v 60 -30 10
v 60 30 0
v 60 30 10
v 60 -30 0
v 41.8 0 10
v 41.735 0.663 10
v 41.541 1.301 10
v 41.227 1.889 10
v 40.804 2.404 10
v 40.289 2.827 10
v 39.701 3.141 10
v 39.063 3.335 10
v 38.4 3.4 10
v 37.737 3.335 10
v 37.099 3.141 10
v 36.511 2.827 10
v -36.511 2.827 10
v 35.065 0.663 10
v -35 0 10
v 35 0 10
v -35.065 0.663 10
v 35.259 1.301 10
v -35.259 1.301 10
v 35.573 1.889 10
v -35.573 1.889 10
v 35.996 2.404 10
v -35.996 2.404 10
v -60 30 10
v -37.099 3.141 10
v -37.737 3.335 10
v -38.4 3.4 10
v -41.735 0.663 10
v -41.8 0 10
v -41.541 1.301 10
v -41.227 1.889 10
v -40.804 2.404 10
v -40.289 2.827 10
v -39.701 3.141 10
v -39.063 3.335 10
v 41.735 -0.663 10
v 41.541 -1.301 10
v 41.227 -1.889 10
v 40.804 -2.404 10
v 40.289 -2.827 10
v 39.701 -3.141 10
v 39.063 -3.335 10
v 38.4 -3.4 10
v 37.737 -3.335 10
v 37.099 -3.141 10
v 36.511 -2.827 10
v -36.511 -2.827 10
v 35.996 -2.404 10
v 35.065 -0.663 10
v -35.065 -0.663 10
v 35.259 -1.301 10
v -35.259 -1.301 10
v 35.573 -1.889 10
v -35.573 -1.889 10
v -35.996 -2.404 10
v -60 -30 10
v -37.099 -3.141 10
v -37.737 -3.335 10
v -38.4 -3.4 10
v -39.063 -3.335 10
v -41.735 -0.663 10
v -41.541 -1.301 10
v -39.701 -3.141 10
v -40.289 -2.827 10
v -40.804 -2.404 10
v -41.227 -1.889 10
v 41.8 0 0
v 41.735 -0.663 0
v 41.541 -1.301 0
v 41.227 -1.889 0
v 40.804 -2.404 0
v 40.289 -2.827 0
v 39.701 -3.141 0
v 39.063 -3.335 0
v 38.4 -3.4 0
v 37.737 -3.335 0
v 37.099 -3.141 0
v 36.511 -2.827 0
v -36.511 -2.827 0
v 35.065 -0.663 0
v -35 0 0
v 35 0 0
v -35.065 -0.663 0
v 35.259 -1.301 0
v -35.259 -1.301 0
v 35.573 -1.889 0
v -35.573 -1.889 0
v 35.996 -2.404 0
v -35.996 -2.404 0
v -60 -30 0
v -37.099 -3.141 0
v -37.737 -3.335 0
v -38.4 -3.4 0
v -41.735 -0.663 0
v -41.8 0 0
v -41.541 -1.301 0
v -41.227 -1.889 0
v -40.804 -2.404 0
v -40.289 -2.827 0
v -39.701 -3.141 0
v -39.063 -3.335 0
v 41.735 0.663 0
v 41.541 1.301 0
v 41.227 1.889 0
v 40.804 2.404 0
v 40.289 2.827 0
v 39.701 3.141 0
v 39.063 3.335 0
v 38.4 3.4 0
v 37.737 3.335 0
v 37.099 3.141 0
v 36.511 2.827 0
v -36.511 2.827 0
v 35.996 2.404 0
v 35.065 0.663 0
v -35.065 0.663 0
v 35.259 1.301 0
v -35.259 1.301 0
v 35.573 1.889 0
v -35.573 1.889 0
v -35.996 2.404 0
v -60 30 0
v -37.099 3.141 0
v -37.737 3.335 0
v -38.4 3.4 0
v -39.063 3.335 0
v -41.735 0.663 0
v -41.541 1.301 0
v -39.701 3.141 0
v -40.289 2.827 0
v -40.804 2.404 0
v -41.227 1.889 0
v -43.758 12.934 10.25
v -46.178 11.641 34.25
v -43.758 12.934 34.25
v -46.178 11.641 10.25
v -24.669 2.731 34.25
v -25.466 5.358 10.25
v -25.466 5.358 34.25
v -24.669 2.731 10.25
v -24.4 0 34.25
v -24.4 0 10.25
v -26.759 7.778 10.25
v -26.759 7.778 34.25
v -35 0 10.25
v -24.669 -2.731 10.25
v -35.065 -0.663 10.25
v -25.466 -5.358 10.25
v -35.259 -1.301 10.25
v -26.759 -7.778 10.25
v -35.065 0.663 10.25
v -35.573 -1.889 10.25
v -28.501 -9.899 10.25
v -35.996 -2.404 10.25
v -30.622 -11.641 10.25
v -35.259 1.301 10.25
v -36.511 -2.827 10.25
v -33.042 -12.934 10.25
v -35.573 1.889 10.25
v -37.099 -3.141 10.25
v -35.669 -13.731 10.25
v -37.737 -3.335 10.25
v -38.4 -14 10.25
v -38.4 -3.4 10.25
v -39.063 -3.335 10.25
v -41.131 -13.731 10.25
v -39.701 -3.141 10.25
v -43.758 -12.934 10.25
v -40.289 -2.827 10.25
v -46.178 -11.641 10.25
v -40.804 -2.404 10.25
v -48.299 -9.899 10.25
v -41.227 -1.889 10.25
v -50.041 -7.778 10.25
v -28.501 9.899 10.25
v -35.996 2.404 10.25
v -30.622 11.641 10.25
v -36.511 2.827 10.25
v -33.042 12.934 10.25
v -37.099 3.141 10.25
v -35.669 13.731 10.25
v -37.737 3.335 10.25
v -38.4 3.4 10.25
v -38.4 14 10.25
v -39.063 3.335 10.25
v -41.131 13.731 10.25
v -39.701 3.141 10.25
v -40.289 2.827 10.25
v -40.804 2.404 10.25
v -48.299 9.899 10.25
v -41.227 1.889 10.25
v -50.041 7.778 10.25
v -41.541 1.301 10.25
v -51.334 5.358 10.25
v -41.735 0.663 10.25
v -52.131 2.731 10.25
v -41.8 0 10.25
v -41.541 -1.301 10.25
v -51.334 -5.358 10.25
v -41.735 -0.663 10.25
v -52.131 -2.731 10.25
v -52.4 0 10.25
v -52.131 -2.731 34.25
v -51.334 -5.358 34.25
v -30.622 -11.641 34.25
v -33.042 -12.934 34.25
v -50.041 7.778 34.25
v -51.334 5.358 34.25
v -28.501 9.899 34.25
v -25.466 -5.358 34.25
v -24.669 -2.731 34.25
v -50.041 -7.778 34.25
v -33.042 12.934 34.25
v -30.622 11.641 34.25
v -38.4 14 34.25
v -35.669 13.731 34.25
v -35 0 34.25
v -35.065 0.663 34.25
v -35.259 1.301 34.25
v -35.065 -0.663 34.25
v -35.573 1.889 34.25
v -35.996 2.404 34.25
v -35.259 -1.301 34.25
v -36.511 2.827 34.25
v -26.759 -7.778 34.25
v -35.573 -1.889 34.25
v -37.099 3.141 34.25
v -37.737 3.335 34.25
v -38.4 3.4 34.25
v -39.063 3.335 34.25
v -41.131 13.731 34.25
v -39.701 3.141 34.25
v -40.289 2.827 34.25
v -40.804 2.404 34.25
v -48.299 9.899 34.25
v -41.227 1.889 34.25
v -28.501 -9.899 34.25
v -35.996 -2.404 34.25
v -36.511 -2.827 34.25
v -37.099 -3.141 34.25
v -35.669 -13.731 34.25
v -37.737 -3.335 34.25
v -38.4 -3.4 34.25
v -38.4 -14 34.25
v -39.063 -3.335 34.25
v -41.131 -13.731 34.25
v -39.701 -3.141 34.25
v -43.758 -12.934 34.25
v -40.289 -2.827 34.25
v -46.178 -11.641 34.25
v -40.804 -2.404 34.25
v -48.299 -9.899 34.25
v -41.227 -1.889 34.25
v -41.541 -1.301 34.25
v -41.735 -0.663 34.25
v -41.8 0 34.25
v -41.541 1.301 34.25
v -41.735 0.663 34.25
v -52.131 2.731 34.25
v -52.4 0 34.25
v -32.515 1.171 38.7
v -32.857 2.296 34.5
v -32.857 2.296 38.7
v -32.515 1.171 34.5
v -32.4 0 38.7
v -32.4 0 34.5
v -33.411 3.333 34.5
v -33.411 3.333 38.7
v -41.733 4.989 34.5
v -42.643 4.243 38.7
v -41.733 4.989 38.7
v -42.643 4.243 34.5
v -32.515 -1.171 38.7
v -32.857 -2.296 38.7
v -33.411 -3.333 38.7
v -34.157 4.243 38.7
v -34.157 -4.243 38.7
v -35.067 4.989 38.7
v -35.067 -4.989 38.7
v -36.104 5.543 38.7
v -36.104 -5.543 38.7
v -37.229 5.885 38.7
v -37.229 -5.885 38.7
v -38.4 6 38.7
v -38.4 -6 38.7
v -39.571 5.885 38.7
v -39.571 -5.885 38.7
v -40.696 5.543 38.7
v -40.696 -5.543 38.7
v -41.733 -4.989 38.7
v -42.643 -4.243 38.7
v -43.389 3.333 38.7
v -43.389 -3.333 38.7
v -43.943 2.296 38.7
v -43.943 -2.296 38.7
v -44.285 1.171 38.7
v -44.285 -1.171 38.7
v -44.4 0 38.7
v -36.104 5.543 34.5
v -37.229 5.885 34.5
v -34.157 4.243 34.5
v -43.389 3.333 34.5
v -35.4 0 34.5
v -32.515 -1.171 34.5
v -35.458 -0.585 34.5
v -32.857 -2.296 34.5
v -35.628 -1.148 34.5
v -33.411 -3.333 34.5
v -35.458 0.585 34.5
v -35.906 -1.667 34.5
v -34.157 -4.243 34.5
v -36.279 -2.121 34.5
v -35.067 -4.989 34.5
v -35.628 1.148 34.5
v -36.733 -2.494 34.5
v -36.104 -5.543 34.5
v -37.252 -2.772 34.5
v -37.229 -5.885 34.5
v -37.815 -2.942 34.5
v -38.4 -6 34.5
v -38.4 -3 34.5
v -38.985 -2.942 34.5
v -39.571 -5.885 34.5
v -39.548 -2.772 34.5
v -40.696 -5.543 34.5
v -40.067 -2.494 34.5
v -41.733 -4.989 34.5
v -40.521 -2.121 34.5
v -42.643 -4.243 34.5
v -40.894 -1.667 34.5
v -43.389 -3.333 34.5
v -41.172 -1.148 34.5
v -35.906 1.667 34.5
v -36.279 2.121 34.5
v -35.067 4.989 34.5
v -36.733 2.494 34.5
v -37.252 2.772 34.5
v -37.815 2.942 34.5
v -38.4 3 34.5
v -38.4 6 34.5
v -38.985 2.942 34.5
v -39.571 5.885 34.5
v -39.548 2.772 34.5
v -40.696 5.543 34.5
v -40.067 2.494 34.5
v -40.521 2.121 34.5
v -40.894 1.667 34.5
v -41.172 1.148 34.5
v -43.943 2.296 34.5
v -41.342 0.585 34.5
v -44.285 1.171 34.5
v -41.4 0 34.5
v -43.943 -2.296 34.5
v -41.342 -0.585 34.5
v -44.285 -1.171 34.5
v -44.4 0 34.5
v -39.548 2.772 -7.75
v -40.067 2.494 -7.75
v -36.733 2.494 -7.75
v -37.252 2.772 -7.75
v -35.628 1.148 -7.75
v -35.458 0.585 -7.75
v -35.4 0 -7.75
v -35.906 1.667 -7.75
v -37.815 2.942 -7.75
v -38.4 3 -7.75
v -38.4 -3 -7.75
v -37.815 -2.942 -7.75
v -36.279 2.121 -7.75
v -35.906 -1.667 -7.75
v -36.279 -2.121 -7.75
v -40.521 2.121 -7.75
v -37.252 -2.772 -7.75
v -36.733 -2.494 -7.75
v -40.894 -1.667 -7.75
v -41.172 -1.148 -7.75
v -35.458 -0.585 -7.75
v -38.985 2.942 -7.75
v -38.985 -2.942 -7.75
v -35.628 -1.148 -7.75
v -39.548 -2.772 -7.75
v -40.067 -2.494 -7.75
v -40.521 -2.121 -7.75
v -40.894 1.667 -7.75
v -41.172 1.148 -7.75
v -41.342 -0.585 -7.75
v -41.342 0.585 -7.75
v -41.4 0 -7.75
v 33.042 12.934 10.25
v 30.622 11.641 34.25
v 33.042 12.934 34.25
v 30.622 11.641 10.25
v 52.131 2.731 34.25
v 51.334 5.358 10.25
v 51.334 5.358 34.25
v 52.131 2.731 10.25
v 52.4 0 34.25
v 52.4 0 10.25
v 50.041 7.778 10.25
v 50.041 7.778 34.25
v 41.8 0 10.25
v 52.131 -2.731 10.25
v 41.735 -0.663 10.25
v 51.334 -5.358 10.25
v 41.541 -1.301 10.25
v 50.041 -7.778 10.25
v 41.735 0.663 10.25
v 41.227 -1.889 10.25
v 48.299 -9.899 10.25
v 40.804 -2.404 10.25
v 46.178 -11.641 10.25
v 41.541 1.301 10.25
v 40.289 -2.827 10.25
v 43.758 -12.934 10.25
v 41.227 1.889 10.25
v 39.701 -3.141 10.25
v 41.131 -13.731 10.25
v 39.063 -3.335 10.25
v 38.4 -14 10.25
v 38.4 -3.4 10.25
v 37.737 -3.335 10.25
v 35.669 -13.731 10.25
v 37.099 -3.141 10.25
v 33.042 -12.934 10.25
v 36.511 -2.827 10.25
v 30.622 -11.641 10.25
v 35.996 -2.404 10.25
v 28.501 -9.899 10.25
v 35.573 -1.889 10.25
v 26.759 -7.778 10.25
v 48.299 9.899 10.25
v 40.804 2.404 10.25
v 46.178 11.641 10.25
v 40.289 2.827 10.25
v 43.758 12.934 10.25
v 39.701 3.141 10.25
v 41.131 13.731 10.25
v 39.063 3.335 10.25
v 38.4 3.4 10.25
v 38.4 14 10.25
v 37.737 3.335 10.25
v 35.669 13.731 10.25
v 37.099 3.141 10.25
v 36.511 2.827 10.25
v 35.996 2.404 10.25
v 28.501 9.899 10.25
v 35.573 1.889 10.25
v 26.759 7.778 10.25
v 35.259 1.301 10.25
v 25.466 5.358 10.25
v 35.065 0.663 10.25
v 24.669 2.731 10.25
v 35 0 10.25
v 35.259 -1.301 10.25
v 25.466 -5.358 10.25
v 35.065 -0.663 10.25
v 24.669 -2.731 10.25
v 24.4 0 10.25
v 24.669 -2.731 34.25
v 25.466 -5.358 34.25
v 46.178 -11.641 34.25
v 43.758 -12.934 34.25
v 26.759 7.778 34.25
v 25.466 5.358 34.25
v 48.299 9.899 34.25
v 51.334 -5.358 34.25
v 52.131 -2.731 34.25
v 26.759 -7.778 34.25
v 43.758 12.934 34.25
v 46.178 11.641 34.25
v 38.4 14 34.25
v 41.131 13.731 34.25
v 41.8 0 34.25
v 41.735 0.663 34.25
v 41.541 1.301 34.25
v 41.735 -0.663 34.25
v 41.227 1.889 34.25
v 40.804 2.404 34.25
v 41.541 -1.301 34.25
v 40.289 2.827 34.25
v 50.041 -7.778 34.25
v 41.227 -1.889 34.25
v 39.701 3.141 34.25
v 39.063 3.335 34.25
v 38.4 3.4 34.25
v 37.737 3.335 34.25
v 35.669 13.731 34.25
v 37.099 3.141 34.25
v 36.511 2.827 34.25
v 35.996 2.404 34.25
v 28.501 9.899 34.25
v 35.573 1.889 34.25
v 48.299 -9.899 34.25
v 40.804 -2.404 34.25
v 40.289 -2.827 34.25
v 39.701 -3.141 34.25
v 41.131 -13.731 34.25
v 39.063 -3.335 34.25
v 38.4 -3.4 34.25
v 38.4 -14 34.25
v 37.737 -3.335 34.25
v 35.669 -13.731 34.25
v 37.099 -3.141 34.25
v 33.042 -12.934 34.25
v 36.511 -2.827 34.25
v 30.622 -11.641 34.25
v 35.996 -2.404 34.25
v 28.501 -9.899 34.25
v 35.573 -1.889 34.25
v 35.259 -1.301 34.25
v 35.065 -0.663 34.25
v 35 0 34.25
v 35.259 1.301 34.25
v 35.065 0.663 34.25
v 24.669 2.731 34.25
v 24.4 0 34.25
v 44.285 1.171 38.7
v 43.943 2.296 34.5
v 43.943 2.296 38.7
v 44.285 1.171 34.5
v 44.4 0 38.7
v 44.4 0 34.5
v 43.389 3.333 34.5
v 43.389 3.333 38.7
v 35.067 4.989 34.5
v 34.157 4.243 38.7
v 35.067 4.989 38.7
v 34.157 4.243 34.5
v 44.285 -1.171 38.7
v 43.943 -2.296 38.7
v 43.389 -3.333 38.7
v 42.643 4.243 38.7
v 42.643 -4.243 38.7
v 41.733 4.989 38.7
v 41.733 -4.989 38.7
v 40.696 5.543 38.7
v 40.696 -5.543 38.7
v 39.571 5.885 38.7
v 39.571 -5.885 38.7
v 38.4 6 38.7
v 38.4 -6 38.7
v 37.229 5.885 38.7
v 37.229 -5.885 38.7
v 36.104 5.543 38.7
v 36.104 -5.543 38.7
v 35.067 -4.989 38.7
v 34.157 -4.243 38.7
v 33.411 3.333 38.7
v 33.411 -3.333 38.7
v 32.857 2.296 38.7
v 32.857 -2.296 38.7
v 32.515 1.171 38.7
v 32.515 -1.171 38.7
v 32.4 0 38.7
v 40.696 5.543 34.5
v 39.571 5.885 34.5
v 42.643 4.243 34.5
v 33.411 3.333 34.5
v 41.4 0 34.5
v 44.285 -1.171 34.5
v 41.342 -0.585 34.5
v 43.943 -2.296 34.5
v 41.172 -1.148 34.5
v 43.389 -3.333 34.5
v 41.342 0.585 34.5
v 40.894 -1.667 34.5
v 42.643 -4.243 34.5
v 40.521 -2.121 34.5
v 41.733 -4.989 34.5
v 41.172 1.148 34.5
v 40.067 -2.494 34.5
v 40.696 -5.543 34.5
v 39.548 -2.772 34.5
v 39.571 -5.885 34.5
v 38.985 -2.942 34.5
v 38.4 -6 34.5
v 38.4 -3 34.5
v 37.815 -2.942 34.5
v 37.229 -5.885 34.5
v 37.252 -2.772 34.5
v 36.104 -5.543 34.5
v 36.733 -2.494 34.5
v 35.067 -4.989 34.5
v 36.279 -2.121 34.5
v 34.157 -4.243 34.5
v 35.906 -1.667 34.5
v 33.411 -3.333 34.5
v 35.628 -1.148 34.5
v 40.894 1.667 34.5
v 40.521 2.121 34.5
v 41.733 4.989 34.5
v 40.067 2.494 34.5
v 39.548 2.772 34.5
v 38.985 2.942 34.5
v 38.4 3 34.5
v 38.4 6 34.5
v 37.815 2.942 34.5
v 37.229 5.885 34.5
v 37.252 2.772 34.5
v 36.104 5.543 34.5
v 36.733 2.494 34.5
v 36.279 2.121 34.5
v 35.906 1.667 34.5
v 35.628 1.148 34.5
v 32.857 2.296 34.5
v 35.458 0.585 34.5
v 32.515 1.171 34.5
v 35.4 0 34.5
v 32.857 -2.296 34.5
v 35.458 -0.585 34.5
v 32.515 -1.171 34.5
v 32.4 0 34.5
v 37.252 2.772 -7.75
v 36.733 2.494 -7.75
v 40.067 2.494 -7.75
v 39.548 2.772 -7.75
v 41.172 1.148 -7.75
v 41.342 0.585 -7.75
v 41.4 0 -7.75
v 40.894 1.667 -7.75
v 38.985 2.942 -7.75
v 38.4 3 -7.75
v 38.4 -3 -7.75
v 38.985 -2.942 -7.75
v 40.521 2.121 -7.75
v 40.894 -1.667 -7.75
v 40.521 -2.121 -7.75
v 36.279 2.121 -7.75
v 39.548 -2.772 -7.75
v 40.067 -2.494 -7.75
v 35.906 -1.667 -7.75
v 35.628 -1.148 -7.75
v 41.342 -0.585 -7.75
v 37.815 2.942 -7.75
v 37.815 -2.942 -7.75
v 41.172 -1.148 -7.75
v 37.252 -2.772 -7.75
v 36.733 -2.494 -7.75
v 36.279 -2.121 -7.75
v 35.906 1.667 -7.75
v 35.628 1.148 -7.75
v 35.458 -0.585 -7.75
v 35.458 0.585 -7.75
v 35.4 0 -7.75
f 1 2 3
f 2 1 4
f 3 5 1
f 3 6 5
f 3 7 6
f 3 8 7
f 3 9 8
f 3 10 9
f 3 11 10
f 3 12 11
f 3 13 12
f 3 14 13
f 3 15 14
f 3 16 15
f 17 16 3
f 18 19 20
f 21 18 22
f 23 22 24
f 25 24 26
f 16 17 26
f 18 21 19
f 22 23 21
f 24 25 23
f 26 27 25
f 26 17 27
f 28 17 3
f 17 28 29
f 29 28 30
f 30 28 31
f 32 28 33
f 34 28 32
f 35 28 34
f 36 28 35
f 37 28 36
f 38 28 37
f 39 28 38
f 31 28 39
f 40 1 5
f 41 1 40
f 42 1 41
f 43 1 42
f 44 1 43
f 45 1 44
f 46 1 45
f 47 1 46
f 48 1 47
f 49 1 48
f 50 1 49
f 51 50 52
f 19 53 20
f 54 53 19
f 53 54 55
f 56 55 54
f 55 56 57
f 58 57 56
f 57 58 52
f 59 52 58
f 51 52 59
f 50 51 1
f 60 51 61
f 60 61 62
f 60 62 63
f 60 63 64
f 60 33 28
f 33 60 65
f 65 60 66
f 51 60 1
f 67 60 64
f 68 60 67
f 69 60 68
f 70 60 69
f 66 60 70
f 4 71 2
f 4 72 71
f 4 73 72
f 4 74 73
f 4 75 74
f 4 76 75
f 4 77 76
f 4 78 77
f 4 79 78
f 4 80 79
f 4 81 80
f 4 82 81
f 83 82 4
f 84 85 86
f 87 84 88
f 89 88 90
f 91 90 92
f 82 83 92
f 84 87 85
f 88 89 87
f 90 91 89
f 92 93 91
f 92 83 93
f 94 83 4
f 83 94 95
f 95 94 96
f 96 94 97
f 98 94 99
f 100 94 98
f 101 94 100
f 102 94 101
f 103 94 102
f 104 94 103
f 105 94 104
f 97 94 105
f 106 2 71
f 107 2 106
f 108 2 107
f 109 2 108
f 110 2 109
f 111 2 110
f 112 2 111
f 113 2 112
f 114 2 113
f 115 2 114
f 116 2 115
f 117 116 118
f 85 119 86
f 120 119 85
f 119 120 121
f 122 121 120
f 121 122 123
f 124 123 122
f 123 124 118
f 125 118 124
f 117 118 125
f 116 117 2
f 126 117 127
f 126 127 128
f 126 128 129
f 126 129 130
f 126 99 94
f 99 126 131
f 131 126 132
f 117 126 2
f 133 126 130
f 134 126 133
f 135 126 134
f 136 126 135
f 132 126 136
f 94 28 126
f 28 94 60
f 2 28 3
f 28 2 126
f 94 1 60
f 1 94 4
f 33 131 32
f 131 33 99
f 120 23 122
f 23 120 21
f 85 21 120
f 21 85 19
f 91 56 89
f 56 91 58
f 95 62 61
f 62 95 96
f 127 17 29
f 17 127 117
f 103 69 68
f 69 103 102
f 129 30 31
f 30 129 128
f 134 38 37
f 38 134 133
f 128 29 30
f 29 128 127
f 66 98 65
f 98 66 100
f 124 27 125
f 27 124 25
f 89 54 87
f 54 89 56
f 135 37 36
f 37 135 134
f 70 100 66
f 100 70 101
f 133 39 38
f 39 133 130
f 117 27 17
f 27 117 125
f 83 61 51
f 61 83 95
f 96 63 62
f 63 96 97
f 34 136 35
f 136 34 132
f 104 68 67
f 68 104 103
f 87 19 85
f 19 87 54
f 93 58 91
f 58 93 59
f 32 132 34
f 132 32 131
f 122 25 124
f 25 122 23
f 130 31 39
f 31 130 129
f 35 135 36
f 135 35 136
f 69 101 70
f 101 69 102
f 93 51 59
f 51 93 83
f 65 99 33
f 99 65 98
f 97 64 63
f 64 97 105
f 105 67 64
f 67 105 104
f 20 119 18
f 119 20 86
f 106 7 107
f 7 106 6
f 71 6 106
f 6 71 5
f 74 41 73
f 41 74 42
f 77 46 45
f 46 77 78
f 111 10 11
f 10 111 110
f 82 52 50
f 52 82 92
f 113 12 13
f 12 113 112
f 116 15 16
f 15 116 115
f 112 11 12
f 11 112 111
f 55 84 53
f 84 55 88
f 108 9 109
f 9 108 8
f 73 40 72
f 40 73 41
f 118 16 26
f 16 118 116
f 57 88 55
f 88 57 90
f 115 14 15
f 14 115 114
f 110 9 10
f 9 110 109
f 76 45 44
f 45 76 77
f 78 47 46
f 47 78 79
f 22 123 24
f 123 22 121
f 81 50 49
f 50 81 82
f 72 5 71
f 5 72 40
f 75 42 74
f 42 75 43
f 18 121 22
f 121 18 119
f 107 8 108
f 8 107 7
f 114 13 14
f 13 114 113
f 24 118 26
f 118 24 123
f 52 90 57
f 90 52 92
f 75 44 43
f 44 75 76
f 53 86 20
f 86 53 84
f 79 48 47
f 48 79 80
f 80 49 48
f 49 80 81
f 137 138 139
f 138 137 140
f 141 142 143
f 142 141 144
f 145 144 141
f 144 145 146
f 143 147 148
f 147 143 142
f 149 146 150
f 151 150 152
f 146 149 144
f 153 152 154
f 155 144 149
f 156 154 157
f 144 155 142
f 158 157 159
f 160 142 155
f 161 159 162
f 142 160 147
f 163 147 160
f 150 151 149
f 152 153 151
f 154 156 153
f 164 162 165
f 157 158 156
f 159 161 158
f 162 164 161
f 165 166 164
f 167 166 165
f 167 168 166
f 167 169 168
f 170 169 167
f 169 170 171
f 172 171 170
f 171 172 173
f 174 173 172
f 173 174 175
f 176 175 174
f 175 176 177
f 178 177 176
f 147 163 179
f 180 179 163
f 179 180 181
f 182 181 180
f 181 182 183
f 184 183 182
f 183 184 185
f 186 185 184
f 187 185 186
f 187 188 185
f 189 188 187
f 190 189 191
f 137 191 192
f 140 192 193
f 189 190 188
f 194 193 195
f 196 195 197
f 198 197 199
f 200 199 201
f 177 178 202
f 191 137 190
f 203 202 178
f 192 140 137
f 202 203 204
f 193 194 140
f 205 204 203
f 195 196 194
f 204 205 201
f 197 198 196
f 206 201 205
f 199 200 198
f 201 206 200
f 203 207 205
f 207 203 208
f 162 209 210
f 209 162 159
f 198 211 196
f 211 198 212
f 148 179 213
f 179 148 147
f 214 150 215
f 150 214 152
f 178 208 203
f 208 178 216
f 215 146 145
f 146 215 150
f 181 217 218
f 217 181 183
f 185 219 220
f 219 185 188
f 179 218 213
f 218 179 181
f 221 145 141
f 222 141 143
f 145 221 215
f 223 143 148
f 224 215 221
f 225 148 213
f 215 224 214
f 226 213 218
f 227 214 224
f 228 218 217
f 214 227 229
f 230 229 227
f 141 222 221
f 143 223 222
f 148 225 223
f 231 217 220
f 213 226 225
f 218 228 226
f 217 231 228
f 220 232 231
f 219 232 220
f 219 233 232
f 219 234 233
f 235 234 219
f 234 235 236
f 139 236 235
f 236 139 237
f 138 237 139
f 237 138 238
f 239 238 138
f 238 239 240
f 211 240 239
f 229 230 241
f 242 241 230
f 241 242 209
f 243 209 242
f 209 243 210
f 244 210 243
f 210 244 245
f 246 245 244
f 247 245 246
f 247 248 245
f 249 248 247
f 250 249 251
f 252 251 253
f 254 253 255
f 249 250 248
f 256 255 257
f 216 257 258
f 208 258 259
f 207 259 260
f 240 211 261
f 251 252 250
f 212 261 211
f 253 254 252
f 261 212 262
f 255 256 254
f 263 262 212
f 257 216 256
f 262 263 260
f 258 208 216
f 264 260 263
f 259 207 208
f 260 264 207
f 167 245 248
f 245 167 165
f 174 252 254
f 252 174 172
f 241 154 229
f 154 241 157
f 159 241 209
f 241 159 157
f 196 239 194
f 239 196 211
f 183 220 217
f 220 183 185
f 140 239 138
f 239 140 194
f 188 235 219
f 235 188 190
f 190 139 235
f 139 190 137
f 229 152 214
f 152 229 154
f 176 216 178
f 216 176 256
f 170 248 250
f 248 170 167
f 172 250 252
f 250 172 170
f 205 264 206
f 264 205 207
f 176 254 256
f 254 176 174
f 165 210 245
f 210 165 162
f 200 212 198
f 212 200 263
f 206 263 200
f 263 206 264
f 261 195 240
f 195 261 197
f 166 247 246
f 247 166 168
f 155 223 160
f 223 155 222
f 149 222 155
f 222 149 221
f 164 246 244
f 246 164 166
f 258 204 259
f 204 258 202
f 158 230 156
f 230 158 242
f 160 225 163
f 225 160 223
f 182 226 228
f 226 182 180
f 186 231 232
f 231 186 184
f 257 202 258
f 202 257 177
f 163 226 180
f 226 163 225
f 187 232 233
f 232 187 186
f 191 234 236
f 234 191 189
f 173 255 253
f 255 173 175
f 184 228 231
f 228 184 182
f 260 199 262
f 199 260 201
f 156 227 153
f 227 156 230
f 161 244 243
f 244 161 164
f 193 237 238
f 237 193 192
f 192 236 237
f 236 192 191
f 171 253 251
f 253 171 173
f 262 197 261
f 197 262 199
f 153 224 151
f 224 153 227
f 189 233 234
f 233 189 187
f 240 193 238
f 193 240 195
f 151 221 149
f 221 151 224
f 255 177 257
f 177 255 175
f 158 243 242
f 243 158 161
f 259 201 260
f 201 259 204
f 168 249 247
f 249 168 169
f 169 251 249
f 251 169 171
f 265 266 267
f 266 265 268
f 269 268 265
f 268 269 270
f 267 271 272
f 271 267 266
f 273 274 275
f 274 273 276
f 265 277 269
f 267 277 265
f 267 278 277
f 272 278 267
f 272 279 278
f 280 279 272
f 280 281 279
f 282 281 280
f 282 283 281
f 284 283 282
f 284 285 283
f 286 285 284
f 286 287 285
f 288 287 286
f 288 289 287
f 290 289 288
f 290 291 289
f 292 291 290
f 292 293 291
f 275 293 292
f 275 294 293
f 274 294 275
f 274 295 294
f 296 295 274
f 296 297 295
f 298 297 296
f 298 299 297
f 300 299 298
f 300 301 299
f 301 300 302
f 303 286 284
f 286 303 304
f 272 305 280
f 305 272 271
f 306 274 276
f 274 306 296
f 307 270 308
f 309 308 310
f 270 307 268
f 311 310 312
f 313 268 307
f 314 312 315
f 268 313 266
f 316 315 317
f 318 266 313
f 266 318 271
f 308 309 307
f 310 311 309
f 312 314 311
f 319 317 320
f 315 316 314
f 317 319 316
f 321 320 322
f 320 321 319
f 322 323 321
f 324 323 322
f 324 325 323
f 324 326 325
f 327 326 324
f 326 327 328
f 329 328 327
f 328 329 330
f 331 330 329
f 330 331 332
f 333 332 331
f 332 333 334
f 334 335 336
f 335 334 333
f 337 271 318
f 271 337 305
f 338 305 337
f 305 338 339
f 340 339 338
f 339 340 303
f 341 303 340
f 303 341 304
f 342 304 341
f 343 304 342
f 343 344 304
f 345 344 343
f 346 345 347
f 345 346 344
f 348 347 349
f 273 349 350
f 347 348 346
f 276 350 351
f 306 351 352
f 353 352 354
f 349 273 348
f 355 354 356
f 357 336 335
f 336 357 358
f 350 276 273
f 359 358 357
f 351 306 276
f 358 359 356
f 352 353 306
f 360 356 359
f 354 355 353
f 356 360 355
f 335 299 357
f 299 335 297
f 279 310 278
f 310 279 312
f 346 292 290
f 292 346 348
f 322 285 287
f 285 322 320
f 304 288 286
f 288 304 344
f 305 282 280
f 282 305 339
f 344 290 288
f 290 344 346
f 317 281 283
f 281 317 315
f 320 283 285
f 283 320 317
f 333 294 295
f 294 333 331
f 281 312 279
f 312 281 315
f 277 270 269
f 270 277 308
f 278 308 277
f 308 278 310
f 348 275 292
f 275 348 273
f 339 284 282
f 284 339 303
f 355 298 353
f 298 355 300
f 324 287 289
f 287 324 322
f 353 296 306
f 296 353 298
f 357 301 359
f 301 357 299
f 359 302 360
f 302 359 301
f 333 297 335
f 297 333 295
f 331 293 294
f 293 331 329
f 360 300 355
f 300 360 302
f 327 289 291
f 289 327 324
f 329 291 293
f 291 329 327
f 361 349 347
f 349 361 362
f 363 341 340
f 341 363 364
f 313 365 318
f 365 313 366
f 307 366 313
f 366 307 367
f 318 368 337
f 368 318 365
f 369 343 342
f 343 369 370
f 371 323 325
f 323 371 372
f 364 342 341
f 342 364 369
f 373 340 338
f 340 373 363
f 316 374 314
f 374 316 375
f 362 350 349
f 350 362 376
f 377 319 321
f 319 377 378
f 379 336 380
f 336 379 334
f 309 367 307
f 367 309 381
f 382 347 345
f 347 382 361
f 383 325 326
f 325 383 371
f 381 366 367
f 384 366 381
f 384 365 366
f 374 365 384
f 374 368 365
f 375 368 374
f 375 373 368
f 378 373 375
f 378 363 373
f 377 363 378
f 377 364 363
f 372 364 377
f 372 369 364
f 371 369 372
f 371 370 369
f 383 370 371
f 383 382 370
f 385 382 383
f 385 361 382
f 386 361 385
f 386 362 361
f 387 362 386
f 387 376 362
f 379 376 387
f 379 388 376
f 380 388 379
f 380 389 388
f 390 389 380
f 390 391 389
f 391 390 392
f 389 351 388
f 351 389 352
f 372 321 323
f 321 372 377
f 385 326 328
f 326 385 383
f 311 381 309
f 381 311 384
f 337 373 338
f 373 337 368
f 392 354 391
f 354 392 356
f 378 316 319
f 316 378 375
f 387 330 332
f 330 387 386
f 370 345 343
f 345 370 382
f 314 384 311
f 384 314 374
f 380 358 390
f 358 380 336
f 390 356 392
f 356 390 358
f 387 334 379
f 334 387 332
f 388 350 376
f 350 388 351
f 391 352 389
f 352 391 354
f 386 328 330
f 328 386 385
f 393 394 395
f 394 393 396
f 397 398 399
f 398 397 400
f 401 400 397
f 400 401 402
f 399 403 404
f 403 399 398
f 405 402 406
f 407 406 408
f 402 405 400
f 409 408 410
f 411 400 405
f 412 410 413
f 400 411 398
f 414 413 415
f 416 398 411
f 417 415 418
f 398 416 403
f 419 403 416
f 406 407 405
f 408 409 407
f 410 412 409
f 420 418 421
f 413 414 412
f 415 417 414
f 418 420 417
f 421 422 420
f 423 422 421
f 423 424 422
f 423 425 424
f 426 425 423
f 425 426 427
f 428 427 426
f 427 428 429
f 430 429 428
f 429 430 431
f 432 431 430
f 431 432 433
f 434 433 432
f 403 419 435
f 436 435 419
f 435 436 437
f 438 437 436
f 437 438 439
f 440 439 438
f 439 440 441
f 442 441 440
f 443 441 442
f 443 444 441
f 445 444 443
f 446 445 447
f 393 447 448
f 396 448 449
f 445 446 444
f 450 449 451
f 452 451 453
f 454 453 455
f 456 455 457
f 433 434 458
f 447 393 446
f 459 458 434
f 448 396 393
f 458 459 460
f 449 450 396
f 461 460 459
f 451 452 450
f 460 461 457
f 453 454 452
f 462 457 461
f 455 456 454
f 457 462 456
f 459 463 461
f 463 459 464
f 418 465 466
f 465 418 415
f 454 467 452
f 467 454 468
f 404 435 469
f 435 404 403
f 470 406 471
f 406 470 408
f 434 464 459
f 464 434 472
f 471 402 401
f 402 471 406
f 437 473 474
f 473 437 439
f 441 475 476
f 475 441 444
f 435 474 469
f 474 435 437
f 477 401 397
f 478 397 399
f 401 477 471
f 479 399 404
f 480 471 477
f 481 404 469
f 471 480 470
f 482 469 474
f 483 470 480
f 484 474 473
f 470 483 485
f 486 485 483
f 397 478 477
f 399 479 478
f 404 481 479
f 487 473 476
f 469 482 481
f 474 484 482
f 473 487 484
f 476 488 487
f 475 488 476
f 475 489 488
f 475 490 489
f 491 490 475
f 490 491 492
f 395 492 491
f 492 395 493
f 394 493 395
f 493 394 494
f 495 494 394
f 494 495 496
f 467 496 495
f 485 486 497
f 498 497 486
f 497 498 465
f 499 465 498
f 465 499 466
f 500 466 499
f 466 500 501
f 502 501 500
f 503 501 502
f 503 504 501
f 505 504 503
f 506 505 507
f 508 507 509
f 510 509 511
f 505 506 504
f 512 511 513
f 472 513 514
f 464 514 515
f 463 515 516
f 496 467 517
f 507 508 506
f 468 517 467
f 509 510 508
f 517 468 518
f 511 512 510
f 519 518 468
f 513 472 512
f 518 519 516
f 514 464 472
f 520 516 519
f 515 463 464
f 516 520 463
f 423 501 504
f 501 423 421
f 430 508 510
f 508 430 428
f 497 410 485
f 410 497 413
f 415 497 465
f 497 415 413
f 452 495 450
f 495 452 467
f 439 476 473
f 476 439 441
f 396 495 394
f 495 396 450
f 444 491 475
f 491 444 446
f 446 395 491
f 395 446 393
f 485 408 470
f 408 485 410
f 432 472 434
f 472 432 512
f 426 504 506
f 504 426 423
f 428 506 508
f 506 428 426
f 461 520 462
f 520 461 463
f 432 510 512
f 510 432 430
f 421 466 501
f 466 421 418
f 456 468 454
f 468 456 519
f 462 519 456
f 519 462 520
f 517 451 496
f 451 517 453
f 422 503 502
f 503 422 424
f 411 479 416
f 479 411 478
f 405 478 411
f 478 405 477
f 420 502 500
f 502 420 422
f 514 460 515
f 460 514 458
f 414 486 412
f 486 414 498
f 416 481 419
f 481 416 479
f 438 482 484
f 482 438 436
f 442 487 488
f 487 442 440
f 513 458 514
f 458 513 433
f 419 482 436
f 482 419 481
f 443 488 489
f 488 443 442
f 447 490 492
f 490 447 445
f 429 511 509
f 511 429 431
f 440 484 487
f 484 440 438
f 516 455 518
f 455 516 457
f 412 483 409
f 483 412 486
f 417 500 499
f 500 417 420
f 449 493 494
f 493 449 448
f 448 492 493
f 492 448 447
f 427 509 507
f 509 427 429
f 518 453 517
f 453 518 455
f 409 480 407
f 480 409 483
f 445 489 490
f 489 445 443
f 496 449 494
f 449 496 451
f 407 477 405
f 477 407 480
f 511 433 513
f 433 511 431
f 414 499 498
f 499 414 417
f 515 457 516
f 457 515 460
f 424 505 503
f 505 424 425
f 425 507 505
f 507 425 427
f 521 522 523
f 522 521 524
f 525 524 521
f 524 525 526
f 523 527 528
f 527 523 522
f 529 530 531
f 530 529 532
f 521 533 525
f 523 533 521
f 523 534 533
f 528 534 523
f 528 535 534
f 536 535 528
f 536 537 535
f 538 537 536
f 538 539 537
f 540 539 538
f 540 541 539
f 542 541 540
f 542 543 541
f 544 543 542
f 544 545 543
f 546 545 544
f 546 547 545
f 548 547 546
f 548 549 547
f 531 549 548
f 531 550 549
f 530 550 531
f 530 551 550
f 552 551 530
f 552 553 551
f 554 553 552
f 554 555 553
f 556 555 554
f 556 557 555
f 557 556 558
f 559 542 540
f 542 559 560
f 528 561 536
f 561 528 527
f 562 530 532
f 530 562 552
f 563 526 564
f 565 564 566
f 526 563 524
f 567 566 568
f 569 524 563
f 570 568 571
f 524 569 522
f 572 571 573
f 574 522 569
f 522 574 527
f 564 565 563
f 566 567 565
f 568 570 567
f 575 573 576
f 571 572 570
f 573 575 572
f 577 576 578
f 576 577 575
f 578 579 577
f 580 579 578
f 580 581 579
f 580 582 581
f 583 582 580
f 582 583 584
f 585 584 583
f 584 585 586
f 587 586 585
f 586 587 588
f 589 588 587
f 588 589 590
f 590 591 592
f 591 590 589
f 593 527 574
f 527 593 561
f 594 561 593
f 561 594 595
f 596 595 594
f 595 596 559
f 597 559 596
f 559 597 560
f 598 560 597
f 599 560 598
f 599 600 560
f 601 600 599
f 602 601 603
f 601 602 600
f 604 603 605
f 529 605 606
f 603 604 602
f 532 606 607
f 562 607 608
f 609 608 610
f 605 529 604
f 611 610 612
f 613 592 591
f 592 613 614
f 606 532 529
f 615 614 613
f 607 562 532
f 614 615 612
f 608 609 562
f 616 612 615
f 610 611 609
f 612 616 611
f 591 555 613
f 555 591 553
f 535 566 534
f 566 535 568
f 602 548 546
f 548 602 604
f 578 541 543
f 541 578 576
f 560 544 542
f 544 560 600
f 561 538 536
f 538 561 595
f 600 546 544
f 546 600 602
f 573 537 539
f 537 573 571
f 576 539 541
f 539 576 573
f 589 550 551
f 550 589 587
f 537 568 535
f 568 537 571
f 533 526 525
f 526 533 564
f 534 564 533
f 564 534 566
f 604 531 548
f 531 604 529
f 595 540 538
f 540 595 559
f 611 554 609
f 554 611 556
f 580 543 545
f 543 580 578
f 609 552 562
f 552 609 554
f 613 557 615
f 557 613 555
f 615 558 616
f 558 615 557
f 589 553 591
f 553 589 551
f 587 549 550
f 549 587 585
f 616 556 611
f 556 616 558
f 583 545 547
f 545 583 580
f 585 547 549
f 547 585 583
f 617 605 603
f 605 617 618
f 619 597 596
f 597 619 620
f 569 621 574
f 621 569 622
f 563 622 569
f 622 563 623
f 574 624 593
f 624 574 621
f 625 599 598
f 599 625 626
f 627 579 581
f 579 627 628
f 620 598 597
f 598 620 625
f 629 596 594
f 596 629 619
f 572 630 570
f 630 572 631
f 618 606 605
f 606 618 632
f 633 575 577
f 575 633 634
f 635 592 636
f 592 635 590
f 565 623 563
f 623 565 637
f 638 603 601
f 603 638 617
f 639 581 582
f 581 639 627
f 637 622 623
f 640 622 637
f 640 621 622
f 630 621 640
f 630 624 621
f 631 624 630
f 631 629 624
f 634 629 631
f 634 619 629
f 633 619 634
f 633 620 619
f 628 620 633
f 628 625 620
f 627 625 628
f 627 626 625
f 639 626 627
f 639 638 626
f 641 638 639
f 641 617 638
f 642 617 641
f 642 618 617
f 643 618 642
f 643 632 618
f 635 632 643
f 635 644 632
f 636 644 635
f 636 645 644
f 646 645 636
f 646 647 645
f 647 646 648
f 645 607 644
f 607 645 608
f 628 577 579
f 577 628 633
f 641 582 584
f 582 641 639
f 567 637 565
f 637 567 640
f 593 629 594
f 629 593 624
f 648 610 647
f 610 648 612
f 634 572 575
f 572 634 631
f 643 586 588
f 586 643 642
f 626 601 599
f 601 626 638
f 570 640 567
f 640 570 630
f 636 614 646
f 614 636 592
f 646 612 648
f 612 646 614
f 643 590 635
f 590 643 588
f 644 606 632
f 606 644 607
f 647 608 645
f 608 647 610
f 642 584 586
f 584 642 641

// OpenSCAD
$fn = 32;

// ------------------------------------------------------------------------
// Standoff columns: 2 d28 standoffs, bolts d6
// Every part is its own module, assembly() places them once.
// ------------------------------------------------------------------------

// --- part 1 ---
module base_plate() {
  difference() {
    translate([-60, -30, 0]) cube([120, 60, 10]);
    translate([-38.4, 0, -1]) cylinder(h = 12, d = 6.8);
    translate([38.4, 0, -1]) cylinder(h = 12, d = 6.8);
  }
}

// --- part 2 ---
module spacer1() {
  difference() {
      translate([0, 0, 0]) cylinder(h = 24, d = 28);
      translate([0, 0, -1]) cylinder(h = 26, d = 6.8);
    }
}

// --- part 3 ---
module bolt1() {
  cylinder(h = 4.2, d = 12);
  translate([0, 0, -42.25]) cylinder(h = 42.25, d = 6);
}

// --- part 4 ---
module spacer2() {
  difference() {
      translate([0, 0, 0]) cylinder(h = 24, d = 28);
      translate([0, 0, -1]) cylinder(h = 26, d = 6.8);
    }
}

// --- part 5 ---
module bolt2() {
  cylinder(h = 4.2, d = 12);
  translate([0, 0, -42.25]) cylinder(h = 42.25, d = 6);
}

// --- assembly ---
module assembly() {
  translate([0, 0, 0]) rotate([0, 0, 0]) base_plate();
  translate([-38.4, 0, 10.25]) rotate([0, 0, 0]) spacer1();
  translate([-38.4, 0, 34.5]) rotate([0, 0, 0]) bolt1();
  translate([38.4, 0, 10.25]) rotate([0, 0, 0]) spacer2();
  translate([38.4, 0, 34.5]) rotate([0, 0, 0]) bolt2();
}

assembly();
